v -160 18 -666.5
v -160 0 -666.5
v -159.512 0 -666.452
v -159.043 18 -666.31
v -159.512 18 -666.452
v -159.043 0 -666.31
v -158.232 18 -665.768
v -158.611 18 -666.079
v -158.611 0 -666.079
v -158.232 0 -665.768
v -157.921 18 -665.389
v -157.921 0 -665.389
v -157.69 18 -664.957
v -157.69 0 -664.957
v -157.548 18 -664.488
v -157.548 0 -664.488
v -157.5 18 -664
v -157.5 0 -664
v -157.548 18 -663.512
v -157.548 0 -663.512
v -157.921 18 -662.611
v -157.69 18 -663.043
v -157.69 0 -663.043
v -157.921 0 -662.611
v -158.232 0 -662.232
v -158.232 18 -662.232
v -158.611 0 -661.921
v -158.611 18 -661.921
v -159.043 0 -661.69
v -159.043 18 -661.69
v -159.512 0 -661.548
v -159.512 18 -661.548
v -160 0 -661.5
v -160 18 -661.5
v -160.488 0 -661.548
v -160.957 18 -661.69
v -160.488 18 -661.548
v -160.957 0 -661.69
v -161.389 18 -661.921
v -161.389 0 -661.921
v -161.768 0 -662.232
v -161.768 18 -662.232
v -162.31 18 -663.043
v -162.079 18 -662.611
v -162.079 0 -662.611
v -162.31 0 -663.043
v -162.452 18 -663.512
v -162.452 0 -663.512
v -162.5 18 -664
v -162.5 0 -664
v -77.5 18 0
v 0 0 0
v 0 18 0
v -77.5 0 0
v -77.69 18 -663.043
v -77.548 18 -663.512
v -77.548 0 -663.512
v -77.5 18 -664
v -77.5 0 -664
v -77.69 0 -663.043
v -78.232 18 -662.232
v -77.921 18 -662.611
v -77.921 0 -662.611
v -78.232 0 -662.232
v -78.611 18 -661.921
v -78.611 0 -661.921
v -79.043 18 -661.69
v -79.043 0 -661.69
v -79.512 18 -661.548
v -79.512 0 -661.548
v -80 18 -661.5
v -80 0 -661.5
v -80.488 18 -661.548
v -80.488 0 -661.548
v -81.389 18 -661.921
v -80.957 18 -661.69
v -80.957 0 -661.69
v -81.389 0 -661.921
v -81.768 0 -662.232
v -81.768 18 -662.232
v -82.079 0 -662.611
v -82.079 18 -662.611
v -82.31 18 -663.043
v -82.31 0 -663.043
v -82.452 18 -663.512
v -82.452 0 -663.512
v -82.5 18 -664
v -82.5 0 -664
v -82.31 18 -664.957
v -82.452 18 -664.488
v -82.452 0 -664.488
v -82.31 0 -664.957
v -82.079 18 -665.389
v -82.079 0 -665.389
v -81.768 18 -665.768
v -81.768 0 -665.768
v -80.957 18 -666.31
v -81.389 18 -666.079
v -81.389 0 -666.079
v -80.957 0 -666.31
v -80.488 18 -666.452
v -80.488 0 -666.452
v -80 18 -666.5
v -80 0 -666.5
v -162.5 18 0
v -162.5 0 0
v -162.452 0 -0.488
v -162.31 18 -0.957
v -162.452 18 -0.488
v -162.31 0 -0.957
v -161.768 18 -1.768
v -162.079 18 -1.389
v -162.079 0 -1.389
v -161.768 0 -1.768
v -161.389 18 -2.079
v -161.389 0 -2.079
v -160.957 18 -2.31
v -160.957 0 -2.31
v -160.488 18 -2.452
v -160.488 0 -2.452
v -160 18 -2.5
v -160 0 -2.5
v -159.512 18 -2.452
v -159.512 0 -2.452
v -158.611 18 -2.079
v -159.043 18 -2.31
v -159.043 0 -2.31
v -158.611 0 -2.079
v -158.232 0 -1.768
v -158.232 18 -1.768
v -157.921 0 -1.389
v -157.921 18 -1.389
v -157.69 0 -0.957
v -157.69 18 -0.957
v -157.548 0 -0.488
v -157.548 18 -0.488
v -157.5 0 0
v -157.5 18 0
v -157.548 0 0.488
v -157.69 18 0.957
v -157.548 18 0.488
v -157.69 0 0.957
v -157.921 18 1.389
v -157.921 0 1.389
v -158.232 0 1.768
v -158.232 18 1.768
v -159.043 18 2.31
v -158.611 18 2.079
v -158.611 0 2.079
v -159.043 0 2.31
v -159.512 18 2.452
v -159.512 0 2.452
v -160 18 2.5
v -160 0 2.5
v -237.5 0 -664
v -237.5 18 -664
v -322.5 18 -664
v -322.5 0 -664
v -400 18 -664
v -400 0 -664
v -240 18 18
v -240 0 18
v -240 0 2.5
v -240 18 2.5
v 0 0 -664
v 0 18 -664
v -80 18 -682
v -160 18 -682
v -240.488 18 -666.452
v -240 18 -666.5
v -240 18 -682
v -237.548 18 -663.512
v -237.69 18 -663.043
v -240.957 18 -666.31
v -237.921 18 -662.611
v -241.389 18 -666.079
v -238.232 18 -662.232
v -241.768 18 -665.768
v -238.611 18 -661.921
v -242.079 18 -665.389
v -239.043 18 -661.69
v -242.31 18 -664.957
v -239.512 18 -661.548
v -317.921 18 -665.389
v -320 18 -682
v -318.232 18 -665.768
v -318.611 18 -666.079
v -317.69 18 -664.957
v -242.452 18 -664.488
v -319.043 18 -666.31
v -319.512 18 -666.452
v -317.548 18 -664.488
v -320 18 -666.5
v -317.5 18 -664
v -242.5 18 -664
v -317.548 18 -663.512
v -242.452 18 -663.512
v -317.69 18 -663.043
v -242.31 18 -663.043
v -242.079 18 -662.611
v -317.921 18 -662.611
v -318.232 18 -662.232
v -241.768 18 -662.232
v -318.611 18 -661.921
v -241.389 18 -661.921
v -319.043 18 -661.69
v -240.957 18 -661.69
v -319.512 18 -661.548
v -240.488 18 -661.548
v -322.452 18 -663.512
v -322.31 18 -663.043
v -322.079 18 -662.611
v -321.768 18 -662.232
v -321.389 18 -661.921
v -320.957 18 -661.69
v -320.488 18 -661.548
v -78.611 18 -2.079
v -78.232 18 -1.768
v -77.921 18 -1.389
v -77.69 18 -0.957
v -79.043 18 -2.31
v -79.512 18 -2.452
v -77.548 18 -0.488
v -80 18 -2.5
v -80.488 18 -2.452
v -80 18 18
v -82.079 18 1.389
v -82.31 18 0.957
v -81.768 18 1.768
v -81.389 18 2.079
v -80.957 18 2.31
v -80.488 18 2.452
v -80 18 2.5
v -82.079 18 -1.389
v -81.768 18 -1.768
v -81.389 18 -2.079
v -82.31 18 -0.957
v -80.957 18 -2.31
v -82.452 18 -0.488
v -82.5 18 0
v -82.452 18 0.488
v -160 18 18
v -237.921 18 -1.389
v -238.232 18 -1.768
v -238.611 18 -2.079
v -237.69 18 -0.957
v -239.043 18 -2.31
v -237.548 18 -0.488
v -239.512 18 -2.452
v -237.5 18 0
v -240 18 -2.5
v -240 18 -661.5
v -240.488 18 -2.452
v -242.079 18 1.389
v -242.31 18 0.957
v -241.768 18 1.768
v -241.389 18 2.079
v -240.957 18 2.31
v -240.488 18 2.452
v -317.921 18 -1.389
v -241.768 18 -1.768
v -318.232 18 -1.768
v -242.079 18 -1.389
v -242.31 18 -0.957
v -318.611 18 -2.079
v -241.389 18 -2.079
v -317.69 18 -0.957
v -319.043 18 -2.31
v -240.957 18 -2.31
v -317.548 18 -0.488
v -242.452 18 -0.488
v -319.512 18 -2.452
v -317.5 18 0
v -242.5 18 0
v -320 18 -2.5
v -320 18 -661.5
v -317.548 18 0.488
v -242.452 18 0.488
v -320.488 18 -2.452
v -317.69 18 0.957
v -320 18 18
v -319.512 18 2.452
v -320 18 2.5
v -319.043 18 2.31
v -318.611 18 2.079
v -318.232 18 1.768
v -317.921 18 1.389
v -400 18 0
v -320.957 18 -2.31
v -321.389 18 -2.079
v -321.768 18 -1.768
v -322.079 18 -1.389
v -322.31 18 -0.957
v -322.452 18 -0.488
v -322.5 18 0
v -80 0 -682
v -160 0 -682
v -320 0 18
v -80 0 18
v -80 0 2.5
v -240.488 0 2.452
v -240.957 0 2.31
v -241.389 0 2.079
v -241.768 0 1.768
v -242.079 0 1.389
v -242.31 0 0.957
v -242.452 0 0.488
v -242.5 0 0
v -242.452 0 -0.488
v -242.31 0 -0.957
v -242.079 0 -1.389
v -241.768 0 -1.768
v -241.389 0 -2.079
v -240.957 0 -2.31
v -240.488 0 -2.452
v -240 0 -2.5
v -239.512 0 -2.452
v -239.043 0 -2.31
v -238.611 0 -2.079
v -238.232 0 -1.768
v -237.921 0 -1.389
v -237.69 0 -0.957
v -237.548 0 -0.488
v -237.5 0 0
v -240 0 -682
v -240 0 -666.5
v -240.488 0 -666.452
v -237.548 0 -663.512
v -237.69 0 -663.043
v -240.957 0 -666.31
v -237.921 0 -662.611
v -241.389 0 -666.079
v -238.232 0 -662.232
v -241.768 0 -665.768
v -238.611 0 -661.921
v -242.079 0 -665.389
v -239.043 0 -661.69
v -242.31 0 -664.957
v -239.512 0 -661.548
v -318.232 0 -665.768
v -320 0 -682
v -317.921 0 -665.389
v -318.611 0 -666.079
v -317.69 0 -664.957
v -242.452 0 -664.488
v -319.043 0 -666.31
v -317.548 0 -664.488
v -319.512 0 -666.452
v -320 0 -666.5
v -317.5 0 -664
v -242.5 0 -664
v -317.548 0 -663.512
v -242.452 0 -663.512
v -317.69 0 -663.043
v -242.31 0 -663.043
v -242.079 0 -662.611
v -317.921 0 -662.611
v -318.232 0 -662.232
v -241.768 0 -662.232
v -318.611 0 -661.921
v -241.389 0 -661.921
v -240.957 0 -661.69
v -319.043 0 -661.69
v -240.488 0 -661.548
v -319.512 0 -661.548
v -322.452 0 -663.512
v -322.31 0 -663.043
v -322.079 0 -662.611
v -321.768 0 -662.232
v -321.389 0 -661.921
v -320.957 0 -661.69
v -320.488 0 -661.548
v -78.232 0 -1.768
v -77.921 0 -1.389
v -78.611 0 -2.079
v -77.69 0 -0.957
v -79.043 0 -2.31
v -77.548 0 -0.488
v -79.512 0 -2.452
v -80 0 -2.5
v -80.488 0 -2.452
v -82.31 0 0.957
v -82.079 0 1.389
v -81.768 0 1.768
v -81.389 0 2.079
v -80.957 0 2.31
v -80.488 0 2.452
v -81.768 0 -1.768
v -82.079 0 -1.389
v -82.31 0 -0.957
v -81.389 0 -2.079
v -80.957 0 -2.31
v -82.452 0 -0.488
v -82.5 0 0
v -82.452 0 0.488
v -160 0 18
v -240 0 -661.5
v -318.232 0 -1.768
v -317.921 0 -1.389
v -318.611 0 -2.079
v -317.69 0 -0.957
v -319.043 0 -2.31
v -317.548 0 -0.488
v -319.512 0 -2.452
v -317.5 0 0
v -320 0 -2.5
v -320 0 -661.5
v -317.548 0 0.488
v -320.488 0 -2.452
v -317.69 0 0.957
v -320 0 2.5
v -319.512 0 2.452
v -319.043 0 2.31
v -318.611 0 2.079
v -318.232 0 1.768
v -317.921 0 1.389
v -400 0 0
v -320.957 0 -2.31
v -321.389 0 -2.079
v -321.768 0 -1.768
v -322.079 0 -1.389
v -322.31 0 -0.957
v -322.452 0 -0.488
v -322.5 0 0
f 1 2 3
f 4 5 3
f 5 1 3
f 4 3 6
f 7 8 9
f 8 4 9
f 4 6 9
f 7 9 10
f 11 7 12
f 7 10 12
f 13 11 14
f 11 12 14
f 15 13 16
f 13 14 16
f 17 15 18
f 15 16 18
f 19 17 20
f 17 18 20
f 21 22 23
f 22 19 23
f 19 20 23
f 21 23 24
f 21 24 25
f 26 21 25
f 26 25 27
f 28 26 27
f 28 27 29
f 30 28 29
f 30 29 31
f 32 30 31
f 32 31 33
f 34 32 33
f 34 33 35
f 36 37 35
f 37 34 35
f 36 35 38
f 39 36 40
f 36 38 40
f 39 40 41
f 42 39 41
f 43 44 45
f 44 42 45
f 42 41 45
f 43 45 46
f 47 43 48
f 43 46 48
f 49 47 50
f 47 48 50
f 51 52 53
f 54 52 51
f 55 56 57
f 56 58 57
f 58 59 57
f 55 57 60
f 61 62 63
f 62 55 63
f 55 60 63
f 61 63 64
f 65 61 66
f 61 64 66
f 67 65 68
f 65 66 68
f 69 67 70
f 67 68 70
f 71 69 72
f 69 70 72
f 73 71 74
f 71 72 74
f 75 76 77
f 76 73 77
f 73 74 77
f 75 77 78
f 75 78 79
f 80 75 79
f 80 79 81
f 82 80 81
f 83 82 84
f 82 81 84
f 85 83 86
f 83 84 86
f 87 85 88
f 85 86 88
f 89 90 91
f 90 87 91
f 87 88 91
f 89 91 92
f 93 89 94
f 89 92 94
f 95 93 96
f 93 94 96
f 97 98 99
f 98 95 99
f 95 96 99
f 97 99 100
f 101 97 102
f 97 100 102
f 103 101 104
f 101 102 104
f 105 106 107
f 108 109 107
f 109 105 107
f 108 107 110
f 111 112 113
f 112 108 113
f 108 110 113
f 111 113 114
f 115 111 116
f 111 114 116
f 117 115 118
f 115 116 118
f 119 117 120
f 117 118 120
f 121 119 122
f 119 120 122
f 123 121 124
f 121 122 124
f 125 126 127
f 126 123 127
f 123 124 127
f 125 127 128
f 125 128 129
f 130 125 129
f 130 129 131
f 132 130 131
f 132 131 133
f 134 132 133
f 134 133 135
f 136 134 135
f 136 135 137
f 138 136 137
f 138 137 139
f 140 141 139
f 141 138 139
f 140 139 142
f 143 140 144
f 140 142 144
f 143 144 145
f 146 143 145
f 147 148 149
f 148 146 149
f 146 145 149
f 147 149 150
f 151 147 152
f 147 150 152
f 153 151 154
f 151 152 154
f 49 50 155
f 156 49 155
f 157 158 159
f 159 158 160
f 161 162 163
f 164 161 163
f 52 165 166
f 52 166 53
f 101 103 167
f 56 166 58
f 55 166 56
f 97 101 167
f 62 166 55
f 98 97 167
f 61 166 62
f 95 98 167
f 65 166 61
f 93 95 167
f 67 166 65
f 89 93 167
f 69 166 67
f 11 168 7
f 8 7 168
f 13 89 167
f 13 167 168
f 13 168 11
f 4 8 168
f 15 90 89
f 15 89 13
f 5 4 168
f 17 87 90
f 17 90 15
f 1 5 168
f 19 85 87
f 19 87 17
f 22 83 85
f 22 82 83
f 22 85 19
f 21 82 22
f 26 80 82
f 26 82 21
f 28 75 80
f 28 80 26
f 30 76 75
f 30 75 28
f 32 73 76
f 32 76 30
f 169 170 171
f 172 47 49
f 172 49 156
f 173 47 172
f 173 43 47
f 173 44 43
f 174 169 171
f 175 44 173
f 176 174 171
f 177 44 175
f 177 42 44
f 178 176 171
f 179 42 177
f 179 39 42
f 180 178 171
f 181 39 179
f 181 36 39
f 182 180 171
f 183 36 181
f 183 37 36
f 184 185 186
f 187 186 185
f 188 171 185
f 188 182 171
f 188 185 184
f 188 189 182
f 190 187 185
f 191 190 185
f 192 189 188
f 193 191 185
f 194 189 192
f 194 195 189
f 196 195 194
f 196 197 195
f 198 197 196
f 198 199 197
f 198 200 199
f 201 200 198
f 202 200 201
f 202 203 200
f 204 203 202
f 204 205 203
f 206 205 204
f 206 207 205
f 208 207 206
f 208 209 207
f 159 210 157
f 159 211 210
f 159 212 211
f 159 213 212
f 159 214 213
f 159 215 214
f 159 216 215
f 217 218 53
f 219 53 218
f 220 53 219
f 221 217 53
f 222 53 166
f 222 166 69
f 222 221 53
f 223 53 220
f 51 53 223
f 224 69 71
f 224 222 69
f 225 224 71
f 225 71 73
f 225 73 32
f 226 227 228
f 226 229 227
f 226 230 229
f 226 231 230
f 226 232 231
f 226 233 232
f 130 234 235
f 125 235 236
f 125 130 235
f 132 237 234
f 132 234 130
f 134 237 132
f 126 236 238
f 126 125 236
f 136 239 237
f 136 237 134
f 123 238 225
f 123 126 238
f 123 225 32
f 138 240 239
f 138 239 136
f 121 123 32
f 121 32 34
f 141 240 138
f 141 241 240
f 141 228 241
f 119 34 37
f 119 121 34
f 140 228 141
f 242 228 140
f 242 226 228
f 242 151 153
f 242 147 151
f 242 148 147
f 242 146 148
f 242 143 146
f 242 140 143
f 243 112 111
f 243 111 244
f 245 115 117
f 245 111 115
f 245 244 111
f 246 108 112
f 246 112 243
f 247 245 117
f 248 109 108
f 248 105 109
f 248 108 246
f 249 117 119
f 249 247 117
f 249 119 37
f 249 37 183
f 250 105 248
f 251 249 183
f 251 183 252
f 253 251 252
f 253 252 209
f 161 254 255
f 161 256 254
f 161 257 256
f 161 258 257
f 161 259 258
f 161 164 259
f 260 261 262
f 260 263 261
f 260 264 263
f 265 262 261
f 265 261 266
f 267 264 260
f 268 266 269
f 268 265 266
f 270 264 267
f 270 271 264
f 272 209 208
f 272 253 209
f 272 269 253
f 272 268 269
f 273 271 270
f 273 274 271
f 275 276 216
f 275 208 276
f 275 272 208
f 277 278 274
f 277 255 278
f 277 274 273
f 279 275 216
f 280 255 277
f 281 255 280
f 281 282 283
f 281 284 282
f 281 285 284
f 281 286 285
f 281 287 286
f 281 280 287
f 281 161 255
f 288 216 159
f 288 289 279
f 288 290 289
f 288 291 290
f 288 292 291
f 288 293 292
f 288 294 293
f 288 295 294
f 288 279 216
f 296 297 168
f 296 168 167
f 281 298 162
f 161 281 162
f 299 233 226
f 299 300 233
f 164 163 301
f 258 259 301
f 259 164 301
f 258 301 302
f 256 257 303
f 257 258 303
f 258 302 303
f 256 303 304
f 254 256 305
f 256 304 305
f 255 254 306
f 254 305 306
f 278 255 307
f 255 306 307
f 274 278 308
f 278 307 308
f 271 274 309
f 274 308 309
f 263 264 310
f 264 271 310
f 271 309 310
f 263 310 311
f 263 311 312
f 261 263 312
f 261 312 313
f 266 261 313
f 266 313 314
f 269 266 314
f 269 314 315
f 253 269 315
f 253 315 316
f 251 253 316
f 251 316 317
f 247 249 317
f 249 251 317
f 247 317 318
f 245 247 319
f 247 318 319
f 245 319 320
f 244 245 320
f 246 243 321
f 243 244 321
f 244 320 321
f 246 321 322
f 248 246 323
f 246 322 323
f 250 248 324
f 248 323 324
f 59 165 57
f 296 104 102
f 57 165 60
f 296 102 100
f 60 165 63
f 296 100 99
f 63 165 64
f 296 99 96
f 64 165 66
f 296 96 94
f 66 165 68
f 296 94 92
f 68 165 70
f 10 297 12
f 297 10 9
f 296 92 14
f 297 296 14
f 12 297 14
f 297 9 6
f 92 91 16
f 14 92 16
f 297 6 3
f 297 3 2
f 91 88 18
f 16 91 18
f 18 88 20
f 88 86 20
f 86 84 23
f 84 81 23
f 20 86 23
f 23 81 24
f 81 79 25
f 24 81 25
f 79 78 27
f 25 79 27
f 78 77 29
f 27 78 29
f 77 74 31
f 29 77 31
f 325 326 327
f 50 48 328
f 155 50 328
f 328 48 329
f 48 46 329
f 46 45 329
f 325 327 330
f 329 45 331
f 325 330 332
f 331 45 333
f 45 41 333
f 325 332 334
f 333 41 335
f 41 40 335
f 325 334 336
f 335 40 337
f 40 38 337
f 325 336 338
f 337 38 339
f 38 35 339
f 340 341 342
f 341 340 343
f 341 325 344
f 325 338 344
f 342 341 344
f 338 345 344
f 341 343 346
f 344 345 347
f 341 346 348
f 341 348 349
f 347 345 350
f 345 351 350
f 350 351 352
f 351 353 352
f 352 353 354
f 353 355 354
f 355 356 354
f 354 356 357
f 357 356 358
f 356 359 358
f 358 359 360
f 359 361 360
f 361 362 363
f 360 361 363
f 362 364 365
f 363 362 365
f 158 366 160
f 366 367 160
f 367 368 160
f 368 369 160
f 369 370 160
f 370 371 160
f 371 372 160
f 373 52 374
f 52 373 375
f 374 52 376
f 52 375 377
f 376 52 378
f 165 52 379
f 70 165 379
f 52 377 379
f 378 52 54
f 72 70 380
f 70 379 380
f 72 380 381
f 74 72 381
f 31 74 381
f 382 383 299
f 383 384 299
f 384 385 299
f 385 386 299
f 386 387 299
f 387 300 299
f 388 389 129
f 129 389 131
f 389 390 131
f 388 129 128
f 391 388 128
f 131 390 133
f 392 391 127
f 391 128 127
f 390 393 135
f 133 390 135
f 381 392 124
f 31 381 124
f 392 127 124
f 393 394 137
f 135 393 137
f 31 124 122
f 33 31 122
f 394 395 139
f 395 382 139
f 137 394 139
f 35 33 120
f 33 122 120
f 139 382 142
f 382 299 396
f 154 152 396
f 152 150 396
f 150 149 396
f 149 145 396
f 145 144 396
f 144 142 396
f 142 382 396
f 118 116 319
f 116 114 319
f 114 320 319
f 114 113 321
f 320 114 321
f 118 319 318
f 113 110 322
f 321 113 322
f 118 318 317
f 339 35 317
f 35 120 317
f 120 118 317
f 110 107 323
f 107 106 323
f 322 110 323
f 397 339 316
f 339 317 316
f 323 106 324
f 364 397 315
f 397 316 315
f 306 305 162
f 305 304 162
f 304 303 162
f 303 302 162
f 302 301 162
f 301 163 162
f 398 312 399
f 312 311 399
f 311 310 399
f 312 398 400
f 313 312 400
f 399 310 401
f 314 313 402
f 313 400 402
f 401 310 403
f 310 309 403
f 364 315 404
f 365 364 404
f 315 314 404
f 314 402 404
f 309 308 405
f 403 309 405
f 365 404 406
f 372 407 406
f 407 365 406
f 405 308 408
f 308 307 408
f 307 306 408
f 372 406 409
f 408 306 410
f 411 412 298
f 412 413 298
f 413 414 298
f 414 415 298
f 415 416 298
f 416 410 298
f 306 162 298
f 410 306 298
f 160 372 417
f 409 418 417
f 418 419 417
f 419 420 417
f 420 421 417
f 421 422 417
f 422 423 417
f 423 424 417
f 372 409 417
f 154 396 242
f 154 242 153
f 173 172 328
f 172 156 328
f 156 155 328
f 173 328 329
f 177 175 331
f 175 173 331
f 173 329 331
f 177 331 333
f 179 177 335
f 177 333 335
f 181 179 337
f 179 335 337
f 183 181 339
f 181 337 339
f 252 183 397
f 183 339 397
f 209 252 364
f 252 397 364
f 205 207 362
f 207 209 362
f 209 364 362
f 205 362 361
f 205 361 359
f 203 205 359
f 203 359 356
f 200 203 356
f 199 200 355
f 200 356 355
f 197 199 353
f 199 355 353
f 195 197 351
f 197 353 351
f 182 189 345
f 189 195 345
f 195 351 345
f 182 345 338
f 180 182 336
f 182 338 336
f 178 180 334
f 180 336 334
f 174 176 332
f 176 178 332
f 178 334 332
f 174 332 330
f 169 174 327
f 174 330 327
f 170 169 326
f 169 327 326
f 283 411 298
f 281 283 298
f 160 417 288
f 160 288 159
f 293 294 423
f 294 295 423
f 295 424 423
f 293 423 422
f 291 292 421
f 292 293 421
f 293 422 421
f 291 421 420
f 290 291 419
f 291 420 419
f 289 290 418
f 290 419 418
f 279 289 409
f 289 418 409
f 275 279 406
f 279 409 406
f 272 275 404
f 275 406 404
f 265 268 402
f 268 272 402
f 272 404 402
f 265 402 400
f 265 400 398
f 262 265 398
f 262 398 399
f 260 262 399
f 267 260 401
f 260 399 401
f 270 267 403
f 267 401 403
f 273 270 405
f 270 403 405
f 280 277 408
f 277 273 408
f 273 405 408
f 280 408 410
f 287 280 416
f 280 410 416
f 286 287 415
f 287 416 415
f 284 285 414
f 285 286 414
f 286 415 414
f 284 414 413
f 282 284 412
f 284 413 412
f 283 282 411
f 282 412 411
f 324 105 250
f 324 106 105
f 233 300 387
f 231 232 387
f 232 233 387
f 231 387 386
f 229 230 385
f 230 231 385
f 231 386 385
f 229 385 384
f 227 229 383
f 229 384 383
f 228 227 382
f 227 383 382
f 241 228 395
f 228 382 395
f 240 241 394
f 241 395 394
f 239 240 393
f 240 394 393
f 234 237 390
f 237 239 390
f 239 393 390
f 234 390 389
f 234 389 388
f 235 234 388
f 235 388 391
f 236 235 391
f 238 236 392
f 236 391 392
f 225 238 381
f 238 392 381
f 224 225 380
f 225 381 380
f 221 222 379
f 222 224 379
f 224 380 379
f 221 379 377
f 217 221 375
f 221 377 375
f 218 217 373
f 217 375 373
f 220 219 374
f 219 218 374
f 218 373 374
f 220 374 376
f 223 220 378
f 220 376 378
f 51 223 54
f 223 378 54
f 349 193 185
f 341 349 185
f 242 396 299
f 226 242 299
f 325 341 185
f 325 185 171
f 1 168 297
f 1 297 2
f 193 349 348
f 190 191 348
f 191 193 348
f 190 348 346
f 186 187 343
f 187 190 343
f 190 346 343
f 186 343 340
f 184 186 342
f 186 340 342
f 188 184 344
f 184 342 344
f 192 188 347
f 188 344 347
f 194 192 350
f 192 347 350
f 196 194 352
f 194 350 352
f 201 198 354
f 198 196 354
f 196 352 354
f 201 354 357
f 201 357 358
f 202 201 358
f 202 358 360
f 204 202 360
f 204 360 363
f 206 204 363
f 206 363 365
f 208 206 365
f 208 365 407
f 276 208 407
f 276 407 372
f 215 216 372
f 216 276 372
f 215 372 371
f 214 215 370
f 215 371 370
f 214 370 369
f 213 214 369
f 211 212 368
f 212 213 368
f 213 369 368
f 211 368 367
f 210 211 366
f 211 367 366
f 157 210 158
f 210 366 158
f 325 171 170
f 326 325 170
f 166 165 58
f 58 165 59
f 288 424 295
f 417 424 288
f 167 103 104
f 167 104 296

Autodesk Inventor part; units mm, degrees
ref_plane "YZ Plane" through (0, 0, 0) normal (1, 0, 0) x (0, 1, 0)
ref_plane "XZ Plane" through (0, 0, 0) normal (0, 1, 0) x (-1, 0, 0)
ref_plane "XY Plane" through (0, 0, 0) normal (0, 0, 1) x (1, 0, 0)
sketch "Sketch1" plane through (0, 0, 0) normal (0, 1, 0) x (-1, 0, 0)
  line L0 (400, 0) -> (400, -664)
  line L1 (0, -664) -> (0, 0)
  line L2 (320, 2.5) -> (320, 18)
  line L3 (80, 2.5) -> (80, 18)
  line L4 (320, 18) -> (240, 18)
  line L5 (160, 18) -> (80, 18)
  line L6 (322.5, 0) -> (400, 0)
  line L7 (0, 0) -> (77.5, 0)
  line L8 (162.5, 0) -> (237.5, 0)
  arc A0 (320, 2.5) -> (322.5, 0) centre (320, 0) ccw
  arc A1 (237.5, 0) -> (240, 2.5) centre (240, 0) ccw
  arc A2 (160, 2.5) -> (162.5, 0) centre (160, 0) ccw
  arc A3 (77.5, 0) -> (80, 2.5) centre (80, 0) ccw
  line L9 (240, 18) -> (240, 2.5)
  line L10 (160, 18) -> (160, 2.5)
  line L11 (320, -666.5) -> (320, -682)
  line L12 (80, -666.5) -> (80, -682)
  line L13 (320, -682) -> (240, -682)
  line L14 (160, -682) -> (80, -682)
  line L15 (322.5, -664) -> (400, -664)
  line L16 (0, -664) -> (77.5, -664)
  line L17 (162.5, -664) -> (237.5, -664)
  arc A4 (322.5, -664) -> (320, -666.5) centre (320, -664) ccw
  arc A5 (240, -666.5) -> (237.5, -664) centre (240, -664) ccw
  arc A6 (162.5, -664) -> (160, -666.5) centre (160, -664) ccw
  arc A7 (80, -666.5) -> (77.5, -664) centre (80, -664) ccw
  line L18 (240, -682) -> (240, -666.5)
  line L19 (160, -682) -> (160, -666.5)
  dimension "d4" = 80
  dimension "d13" = 18
  dimension "d20" = 5
  dimension "d21" = 5
  dimension "d22" = 5
  dimension "d23" = 5
  dimension "d28" = 80
  dimension "d29" = 18
  dimension "d30" = 80
  dimension "d31" = 18
  dimension "d33" = 80
  dimension "d34" = 18
  dimension "d36" = 18
  dimension "d37" = 664
extrude "Extrusion1" add sketch "Sketch1" along normal blind 18
properties part number "repisaa"
